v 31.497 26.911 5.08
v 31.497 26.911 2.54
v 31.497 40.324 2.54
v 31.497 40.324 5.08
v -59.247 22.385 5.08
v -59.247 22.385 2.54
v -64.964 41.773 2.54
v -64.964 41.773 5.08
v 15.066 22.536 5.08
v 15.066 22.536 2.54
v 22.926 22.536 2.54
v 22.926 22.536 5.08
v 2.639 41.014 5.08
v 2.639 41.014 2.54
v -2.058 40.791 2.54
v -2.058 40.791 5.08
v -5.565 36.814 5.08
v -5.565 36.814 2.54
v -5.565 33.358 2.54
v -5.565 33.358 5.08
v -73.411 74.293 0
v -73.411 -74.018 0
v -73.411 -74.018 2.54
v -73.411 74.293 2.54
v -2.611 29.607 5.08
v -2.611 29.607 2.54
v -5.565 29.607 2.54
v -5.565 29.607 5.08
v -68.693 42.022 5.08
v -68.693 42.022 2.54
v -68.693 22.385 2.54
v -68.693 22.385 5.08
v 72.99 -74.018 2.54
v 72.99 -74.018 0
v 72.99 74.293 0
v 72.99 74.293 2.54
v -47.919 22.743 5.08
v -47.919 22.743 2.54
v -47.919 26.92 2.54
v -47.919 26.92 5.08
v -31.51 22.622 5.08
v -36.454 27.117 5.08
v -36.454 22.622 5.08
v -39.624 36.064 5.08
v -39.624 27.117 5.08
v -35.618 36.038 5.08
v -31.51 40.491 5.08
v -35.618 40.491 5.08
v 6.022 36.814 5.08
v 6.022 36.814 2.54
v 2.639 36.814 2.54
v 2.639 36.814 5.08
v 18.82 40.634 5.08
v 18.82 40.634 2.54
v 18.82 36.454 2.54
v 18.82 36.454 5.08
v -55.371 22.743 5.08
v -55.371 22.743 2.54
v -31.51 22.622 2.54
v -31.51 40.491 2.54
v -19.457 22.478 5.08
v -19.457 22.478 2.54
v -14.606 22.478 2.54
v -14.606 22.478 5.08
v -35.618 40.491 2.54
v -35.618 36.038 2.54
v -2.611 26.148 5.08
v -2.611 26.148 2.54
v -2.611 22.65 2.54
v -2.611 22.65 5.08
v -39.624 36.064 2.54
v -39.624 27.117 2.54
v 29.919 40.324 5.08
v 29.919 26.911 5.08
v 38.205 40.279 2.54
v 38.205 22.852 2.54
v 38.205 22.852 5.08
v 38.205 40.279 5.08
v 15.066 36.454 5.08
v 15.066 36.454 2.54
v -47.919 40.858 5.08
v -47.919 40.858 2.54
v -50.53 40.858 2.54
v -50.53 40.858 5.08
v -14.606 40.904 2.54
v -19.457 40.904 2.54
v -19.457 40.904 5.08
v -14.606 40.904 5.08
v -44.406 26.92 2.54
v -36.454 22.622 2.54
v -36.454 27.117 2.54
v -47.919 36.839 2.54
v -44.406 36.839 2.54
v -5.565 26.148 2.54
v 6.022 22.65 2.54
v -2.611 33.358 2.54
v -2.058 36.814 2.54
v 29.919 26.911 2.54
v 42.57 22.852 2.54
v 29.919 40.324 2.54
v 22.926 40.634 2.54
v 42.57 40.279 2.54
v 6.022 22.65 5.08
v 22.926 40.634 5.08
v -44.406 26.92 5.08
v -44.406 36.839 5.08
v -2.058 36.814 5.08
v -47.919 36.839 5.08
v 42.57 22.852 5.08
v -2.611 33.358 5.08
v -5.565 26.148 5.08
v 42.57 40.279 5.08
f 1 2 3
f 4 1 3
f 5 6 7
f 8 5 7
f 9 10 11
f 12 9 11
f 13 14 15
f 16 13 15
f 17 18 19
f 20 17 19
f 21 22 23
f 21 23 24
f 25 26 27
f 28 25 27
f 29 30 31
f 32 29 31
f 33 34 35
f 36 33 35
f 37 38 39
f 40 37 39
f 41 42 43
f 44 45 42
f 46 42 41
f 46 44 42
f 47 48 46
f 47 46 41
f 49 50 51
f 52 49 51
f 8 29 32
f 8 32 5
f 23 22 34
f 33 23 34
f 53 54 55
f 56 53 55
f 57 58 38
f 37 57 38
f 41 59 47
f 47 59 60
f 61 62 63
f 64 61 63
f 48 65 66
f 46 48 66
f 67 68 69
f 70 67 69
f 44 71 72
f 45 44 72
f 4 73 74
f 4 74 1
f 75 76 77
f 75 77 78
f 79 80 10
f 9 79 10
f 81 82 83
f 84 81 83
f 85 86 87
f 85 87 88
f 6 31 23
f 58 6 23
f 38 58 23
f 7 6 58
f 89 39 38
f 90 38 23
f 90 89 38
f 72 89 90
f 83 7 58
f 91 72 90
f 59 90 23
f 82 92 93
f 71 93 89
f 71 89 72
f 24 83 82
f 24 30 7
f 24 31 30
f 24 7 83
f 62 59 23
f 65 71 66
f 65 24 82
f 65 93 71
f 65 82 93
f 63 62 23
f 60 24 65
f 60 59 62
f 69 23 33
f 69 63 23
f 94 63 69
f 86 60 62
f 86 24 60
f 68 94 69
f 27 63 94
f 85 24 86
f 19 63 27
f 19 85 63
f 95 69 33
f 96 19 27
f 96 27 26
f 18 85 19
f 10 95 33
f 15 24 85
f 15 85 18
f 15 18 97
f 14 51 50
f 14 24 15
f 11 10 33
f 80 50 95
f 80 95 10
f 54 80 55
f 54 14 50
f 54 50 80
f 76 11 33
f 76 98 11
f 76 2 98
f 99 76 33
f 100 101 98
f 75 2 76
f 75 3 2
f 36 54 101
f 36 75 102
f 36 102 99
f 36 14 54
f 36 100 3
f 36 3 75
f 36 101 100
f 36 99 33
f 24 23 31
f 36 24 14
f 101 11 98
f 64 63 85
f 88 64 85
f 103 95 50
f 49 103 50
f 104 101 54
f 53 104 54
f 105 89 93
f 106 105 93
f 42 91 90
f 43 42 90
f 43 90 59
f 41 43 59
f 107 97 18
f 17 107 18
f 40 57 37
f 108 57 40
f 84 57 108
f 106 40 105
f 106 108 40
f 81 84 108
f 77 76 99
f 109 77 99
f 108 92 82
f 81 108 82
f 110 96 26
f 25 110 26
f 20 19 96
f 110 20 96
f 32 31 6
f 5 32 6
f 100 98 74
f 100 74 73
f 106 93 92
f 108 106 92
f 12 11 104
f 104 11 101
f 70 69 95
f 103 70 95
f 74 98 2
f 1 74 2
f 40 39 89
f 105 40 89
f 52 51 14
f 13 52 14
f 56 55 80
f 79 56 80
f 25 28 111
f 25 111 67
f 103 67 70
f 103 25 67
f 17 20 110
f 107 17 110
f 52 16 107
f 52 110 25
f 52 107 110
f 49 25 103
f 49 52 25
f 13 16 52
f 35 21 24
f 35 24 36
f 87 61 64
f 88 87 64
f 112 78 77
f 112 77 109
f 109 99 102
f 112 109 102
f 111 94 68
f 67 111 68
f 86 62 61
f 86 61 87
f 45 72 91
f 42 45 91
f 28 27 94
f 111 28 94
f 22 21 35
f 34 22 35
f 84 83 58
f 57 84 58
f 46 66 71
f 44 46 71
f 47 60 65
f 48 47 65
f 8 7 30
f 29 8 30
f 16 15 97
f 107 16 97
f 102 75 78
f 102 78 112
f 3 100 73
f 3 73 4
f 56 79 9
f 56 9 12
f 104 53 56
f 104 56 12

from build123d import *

# Parameters (mm, degrees)
F0_W      = 146.40107
F0_H      = 148.310445
F1_DEPTH  = 2.54
F4_DEPTH  = 2.54
F6_DEPTH  = 2.54
F8_DEPTH  = 2.54
F9_W      = 4.851737
F9_H      = 18.426374
F10_DEPTH = 2.54
F12_DEPTH = 2.54
F14_DEPTH = 2.54
F15_W     = 1.578693
F15_H     = 13.412963
F16_DEPTH = 2.54
F17_W     = 4.364304
F17_H     = 17.427249
F18_DEPTH = 2.54


with BuildPart() as f1:
    # F0 (on Top) → F1 (new body)
    with BuildSketch(Plane.XY):
        with Locations((-0.210952, 0.137563)):
            Rectangle(F0_W, F0_H)
    extrude(amount=F1_DEPTH)

    # F3 (on offset) → F4 (join)
    with BuildSketch(Plane.XY.offset(2.54)):
        Polygon((-64.964116, 41.773472), (-68.692707, 42.022042), (-68.692707, 22.384809), (-59.246946, 22.384809), align=None)
    extrude(amount=F4_DEPTH)

    # F5 (on offset) → F6 (join)
    with BuildSketch(Plane.XY.offset(2.54)):
        Polygon((-50.52999, 40.857933), (-55.370778, 22.743205), (-47.918595, 22.743205), (-47.918595, 26.920337), (-44.406321, 26.920337), (-44.406321, 36.838796), (-47.918595, 36.838796), (-47.918595, 40.857933), align=None)
    extrude(amount=F6_DEPTH)

    # F7 (on offset) → F8 (join)
    with BuildSketch(Plane.XY.offset(2.54)):
        Polygon((-35.617545, 36.038097), (-39.623722, 36.063977), (-39.623722, 27.117148), (-36.453769, 27.117148), (-36.453769, 22.621898), (-31.509895, 22.621898), (-31.509895, 40.49129), (-35.617545, 40.49129), align=None)
    extrude(amount=F8_DEPTH)

    # F9 (on offset) → F10 (join)
    with BuildSketch(Plane.XY.offset(2.54)):
        with Locations((-17.03154, 31.691134)):
            Rectangle(F9_W, F9_H)
    extrude(amount=F10_DEPTH)

    # F11 (on offset) → F12 (join)
    with BuildSketch(Plane.XY.offset(2.54)):
        Polygon((2.639255, 41.013792), (-2.057669, 40.791102), (-2.057669, 36.814019), (-5.565096, 36.814019), (-5.565096, 33.358328), (-2.61138, 33.358328), (-2.61138, 29.607166), (-5.565096, 29.607166), (-5.565096, 26.148241), (-2.61138, 26.148241), (-2.61138, 22.650495), (6.022215, 22.650495), (6.022215, 36.814019), (2.639255, 36.814019), align=None)
    extrude(amount=F12_DEPTH)

    # F13 (on offset) → F14 (join)
    with BuildSketch(Plane.XY.offset(2.54)):
        Polygon((18.820403, 36.453847), (15.066023, 36.453847), (15.066023, 22.535659), (22.926439, 22.535659), (22.926439, 40.634211), (18.820403, 40.634211), align=None)
    extrude(amount=F14_DEPTH)

    # F15 (on offset) → F16 (join)
    with BuildSketch(Plane.XY.offset(2.54)):
        with Locations((30.708009, 33.6177)):
            Rectangle(F15_W, F15_H)
    extrude(amount=F16_DEPTH)

    # F17 (on offset) → F18 (join)
    with BuildSketch(Plane.XY.offset(2.54)):
        with Locations((40.387601, 31.565268)):
            Rectangle(F17_W, F17_H)
    extrude(amount=F18_DEPTH)


solid = f1.part
